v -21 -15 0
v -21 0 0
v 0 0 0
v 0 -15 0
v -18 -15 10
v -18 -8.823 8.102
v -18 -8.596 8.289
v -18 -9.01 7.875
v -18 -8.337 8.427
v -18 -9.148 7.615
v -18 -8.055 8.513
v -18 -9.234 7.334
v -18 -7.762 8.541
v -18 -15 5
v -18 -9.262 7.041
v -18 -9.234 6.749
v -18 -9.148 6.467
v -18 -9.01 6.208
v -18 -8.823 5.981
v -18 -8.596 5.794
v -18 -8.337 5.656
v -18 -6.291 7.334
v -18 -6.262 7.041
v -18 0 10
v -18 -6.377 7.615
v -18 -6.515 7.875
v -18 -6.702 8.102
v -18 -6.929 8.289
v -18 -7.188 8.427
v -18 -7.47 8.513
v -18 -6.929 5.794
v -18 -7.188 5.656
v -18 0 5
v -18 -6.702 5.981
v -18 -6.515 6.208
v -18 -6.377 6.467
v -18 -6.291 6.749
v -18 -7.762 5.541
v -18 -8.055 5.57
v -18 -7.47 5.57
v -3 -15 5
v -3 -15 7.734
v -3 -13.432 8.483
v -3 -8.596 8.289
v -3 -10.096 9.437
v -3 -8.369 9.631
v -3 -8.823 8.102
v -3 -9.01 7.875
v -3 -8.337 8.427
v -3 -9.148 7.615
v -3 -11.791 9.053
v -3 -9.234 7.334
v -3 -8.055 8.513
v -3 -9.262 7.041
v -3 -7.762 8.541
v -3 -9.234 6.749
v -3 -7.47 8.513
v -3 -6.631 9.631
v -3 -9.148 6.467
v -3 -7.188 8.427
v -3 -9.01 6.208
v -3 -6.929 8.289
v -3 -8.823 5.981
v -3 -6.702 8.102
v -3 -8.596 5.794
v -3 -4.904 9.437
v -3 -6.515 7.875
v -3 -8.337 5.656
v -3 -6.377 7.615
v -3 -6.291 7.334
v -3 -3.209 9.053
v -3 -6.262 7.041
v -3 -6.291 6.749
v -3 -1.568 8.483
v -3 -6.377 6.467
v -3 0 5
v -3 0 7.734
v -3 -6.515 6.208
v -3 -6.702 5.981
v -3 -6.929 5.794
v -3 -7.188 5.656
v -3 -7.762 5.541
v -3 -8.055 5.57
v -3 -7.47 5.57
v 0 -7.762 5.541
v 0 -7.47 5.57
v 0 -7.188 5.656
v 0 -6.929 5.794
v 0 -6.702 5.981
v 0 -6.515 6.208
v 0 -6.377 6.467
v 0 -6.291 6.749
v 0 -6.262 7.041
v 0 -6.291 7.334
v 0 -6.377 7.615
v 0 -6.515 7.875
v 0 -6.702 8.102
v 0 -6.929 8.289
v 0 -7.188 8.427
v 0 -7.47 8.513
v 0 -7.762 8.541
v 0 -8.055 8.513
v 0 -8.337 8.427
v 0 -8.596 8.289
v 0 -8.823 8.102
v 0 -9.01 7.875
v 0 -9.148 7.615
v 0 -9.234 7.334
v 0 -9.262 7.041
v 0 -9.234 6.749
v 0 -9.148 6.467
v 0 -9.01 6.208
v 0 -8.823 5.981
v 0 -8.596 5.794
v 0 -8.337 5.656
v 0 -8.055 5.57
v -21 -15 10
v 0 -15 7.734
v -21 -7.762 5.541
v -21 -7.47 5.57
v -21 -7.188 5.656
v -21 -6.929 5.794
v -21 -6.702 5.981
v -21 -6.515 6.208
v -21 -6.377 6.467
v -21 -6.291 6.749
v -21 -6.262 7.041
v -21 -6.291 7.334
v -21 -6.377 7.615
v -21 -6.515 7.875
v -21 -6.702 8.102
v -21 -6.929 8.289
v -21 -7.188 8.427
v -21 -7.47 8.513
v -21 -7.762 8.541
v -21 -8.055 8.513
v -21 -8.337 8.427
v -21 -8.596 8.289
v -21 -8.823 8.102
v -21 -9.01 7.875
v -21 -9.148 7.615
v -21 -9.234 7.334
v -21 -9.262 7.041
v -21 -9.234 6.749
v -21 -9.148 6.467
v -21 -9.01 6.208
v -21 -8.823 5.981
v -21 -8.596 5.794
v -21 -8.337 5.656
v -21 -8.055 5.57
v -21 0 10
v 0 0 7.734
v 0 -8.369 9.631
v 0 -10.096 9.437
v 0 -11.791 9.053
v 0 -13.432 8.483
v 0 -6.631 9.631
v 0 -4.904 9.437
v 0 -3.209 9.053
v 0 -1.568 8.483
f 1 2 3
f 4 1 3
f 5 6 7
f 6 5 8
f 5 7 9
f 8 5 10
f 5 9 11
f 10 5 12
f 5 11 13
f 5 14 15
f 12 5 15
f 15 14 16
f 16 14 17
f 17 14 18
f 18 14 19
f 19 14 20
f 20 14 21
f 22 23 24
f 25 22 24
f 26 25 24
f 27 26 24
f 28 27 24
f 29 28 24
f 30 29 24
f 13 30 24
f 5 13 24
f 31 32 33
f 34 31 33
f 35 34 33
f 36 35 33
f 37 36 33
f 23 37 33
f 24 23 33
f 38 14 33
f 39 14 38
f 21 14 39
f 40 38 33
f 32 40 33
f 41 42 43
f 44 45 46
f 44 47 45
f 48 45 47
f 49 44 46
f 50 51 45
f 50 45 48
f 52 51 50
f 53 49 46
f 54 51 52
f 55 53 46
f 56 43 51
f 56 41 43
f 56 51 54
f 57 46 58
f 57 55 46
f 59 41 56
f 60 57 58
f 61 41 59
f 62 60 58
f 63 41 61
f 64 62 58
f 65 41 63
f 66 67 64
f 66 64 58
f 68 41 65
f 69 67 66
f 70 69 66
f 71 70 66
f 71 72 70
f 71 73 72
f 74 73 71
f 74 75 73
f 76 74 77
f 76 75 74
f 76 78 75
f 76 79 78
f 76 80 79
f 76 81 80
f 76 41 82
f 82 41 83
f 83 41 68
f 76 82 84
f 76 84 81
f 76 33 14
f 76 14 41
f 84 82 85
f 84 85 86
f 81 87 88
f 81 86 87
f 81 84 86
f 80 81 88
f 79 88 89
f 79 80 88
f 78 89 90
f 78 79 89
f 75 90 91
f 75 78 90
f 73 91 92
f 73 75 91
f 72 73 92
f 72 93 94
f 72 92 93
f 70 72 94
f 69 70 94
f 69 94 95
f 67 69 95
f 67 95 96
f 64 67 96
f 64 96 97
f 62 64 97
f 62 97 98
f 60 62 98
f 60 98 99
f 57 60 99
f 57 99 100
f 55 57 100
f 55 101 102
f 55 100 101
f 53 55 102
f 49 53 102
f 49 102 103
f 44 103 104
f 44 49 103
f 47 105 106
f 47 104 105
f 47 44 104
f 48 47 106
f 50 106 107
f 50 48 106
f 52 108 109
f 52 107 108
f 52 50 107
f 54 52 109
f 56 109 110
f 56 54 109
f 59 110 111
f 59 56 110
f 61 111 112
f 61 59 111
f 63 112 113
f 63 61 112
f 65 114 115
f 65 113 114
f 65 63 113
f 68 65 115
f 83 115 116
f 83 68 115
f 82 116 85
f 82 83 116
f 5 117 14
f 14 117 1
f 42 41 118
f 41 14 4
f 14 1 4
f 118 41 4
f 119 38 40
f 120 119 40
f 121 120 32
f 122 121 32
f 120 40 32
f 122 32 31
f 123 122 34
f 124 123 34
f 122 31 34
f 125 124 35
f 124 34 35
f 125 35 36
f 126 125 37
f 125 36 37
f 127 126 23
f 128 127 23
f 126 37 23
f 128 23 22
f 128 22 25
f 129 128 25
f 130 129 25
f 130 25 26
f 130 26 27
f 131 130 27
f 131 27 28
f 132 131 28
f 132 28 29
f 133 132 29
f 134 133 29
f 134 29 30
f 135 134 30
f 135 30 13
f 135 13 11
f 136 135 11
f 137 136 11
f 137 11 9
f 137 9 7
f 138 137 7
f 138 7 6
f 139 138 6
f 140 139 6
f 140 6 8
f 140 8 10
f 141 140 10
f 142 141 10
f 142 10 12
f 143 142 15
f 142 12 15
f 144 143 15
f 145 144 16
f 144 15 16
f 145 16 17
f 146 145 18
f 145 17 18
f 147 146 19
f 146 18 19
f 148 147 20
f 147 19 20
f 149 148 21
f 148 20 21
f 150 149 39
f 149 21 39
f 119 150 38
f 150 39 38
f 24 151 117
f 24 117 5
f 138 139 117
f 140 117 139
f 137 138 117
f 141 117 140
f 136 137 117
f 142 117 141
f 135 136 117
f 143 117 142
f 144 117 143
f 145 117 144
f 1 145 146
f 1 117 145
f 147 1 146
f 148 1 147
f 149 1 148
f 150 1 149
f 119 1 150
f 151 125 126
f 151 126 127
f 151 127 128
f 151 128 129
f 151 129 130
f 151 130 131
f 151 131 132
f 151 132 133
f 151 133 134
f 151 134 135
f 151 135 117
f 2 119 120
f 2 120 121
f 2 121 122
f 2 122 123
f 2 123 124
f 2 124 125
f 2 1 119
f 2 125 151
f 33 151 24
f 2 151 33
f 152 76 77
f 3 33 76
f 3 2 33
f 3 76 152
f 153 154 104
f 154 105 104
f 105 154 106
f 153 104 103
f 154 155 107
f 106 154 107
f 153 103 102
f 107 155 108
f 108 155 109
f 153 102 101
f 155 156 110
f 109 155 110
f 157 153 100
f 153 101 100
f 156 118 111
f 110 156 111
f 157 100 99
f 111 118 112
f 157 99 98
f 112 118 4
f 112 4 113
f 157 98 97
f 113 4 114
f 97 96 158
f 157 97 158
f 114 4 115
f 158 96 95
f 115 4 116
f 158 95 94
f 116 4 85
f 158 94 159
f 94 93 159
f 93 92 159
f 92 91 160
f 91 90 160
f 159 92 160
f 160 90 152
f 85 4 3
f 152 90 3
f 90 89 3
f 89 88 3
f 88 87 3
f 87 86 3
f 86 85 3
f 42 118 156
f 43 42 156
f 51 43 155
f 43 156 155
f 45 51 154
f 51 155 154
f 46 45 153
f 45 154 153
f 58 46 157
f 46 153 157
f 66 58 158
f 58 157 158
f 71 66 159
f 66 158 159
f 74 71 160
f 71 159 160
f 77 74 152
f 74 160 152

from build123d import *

# Parameters (mm, degrees)
SKETCH1_W               = 21
SKETCH1_H               = 15
BOSS_EXTRUDE1_DEPTH     = 5
SKETCH2_W               = 3
SKETCH2_H               = 15
BOSS_EXTRUDE2_DEPTH     = 5
CUT_EXTRUDE1_DEPTH      = 18
SKETCH4_R               = 1.5
CUT_EXTRUDE2_DEPTH      = 19
CUT_EXTRUDE2_DEPTH_BACK = 4


with BuildPart() as part:
    # Sketch1 → Boss-Extrude1 (new body)
    with BuildSketch(Plane.XY):
        with Locations((-10.5, -7.5)):
            Rectangle(SKETCH1_W, SKETCH1_H)
    extrude(amount=BOSS_EXTRUDE1_DEPTH)

    # Sketch2 → Boss-Extrude2 (add)
    with BuildSketch(Plane.XY.offset(5)):
        with Locations((-1.5, -7.5)):
            Rectangle(SKETCH2_W, SKETCH2_H)
        with Locations((-19.5, -7.5)):
            Rectangle(SKETCH2_W, SKETCH2_H)
    extrude(amount=BOSS_EXTRUDE2_DEPTH)

    # Sketch3 → Cut-Extrude1 (cut)
    with BuildSketch(Plane(origin=(0, 0, 0), x_dir=(0, 0, -1), z_dir=(1, 0, 0))):
        with BuildLine():
            Line((-7.733661886, 0), (-10, 0))
            Line((-10, 0), (-10, -15))
            Line((-10, -15), (-7.733661886, -15))
            ThreePointArc((-7.733661886, -15), (-9.654849758, -7.5), (-7.733661886, 0))
        make_face()
    extrude(amount=-CUT_EXTRUDE1_DEPTH, mode=Mode.SUBTRACT)

    # Sketch4 → Cut-Extrude2 (cut, two sides)
    with BuildSketch(Plane(origin=(-18, 0, 0), x_dir=(0, 0, -1), z_dir=(1, 0, 0))) as cut_extrude2_sk:
        with Locations((-7.041389116, -7.762480296)):
            Circle(SKETCH4_R)
    extrude(amount=CUT_EXTRUDE2_DEPTH, mode=Mode.SUBTRACT)
    extrude(cut_extrude2_sk.sketch, amount=-CUT_EXTRUDE2_DEPTH_BACK, mode=Mode.SUBTRACT)


solid = part.part
